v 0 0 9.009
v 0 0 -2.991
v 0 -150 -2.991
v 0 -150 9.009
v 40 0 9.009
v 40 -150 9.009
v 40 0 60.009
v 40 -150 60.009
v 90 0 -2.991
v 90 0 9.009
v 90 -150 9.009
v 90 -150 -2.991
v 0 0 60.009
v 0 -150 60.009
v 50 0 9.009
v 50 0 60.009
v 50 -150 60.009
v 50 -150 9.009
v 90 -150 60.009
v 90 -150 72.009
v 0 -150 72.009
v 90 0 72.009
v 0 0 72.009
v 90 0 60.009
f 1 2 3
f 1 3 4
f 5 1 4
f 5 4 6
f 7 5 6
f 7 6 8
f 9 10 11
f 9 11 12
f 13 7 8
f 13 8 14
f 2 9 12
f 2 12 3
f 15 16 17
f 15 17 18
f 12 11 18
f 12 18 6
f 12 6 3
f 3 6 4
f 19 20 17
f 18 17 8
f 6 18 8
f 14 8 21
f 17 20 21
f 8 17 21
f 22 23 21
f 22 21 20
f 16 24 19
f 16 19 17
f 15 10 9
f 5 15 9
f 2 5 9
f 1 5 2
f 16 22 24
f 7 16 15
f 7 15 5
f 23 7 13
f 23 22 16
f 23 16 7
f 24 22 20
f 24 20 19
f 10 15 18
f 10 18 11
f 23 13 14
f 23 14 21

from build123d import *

# Parameters (mm, degrees)
PAD_DEPTH = 150


with BuildPart() as part:
    # Sketch → Pad (new body)
    with BuildSketch(Plane.XZ):
        Polygon((0, 72.009016), (90, 72.009016), (90, 60.009016), (50, 60.009016), (50, 9.009016), (90, 9.009016), (90, -2.990984), (0, -2.990984), (0, 9.009016), (40, 9.009016), (40, 60.009016), (0, 60.009016), align=None)
    extrude(amount=PAD_DEPTH)


solid = part.part
